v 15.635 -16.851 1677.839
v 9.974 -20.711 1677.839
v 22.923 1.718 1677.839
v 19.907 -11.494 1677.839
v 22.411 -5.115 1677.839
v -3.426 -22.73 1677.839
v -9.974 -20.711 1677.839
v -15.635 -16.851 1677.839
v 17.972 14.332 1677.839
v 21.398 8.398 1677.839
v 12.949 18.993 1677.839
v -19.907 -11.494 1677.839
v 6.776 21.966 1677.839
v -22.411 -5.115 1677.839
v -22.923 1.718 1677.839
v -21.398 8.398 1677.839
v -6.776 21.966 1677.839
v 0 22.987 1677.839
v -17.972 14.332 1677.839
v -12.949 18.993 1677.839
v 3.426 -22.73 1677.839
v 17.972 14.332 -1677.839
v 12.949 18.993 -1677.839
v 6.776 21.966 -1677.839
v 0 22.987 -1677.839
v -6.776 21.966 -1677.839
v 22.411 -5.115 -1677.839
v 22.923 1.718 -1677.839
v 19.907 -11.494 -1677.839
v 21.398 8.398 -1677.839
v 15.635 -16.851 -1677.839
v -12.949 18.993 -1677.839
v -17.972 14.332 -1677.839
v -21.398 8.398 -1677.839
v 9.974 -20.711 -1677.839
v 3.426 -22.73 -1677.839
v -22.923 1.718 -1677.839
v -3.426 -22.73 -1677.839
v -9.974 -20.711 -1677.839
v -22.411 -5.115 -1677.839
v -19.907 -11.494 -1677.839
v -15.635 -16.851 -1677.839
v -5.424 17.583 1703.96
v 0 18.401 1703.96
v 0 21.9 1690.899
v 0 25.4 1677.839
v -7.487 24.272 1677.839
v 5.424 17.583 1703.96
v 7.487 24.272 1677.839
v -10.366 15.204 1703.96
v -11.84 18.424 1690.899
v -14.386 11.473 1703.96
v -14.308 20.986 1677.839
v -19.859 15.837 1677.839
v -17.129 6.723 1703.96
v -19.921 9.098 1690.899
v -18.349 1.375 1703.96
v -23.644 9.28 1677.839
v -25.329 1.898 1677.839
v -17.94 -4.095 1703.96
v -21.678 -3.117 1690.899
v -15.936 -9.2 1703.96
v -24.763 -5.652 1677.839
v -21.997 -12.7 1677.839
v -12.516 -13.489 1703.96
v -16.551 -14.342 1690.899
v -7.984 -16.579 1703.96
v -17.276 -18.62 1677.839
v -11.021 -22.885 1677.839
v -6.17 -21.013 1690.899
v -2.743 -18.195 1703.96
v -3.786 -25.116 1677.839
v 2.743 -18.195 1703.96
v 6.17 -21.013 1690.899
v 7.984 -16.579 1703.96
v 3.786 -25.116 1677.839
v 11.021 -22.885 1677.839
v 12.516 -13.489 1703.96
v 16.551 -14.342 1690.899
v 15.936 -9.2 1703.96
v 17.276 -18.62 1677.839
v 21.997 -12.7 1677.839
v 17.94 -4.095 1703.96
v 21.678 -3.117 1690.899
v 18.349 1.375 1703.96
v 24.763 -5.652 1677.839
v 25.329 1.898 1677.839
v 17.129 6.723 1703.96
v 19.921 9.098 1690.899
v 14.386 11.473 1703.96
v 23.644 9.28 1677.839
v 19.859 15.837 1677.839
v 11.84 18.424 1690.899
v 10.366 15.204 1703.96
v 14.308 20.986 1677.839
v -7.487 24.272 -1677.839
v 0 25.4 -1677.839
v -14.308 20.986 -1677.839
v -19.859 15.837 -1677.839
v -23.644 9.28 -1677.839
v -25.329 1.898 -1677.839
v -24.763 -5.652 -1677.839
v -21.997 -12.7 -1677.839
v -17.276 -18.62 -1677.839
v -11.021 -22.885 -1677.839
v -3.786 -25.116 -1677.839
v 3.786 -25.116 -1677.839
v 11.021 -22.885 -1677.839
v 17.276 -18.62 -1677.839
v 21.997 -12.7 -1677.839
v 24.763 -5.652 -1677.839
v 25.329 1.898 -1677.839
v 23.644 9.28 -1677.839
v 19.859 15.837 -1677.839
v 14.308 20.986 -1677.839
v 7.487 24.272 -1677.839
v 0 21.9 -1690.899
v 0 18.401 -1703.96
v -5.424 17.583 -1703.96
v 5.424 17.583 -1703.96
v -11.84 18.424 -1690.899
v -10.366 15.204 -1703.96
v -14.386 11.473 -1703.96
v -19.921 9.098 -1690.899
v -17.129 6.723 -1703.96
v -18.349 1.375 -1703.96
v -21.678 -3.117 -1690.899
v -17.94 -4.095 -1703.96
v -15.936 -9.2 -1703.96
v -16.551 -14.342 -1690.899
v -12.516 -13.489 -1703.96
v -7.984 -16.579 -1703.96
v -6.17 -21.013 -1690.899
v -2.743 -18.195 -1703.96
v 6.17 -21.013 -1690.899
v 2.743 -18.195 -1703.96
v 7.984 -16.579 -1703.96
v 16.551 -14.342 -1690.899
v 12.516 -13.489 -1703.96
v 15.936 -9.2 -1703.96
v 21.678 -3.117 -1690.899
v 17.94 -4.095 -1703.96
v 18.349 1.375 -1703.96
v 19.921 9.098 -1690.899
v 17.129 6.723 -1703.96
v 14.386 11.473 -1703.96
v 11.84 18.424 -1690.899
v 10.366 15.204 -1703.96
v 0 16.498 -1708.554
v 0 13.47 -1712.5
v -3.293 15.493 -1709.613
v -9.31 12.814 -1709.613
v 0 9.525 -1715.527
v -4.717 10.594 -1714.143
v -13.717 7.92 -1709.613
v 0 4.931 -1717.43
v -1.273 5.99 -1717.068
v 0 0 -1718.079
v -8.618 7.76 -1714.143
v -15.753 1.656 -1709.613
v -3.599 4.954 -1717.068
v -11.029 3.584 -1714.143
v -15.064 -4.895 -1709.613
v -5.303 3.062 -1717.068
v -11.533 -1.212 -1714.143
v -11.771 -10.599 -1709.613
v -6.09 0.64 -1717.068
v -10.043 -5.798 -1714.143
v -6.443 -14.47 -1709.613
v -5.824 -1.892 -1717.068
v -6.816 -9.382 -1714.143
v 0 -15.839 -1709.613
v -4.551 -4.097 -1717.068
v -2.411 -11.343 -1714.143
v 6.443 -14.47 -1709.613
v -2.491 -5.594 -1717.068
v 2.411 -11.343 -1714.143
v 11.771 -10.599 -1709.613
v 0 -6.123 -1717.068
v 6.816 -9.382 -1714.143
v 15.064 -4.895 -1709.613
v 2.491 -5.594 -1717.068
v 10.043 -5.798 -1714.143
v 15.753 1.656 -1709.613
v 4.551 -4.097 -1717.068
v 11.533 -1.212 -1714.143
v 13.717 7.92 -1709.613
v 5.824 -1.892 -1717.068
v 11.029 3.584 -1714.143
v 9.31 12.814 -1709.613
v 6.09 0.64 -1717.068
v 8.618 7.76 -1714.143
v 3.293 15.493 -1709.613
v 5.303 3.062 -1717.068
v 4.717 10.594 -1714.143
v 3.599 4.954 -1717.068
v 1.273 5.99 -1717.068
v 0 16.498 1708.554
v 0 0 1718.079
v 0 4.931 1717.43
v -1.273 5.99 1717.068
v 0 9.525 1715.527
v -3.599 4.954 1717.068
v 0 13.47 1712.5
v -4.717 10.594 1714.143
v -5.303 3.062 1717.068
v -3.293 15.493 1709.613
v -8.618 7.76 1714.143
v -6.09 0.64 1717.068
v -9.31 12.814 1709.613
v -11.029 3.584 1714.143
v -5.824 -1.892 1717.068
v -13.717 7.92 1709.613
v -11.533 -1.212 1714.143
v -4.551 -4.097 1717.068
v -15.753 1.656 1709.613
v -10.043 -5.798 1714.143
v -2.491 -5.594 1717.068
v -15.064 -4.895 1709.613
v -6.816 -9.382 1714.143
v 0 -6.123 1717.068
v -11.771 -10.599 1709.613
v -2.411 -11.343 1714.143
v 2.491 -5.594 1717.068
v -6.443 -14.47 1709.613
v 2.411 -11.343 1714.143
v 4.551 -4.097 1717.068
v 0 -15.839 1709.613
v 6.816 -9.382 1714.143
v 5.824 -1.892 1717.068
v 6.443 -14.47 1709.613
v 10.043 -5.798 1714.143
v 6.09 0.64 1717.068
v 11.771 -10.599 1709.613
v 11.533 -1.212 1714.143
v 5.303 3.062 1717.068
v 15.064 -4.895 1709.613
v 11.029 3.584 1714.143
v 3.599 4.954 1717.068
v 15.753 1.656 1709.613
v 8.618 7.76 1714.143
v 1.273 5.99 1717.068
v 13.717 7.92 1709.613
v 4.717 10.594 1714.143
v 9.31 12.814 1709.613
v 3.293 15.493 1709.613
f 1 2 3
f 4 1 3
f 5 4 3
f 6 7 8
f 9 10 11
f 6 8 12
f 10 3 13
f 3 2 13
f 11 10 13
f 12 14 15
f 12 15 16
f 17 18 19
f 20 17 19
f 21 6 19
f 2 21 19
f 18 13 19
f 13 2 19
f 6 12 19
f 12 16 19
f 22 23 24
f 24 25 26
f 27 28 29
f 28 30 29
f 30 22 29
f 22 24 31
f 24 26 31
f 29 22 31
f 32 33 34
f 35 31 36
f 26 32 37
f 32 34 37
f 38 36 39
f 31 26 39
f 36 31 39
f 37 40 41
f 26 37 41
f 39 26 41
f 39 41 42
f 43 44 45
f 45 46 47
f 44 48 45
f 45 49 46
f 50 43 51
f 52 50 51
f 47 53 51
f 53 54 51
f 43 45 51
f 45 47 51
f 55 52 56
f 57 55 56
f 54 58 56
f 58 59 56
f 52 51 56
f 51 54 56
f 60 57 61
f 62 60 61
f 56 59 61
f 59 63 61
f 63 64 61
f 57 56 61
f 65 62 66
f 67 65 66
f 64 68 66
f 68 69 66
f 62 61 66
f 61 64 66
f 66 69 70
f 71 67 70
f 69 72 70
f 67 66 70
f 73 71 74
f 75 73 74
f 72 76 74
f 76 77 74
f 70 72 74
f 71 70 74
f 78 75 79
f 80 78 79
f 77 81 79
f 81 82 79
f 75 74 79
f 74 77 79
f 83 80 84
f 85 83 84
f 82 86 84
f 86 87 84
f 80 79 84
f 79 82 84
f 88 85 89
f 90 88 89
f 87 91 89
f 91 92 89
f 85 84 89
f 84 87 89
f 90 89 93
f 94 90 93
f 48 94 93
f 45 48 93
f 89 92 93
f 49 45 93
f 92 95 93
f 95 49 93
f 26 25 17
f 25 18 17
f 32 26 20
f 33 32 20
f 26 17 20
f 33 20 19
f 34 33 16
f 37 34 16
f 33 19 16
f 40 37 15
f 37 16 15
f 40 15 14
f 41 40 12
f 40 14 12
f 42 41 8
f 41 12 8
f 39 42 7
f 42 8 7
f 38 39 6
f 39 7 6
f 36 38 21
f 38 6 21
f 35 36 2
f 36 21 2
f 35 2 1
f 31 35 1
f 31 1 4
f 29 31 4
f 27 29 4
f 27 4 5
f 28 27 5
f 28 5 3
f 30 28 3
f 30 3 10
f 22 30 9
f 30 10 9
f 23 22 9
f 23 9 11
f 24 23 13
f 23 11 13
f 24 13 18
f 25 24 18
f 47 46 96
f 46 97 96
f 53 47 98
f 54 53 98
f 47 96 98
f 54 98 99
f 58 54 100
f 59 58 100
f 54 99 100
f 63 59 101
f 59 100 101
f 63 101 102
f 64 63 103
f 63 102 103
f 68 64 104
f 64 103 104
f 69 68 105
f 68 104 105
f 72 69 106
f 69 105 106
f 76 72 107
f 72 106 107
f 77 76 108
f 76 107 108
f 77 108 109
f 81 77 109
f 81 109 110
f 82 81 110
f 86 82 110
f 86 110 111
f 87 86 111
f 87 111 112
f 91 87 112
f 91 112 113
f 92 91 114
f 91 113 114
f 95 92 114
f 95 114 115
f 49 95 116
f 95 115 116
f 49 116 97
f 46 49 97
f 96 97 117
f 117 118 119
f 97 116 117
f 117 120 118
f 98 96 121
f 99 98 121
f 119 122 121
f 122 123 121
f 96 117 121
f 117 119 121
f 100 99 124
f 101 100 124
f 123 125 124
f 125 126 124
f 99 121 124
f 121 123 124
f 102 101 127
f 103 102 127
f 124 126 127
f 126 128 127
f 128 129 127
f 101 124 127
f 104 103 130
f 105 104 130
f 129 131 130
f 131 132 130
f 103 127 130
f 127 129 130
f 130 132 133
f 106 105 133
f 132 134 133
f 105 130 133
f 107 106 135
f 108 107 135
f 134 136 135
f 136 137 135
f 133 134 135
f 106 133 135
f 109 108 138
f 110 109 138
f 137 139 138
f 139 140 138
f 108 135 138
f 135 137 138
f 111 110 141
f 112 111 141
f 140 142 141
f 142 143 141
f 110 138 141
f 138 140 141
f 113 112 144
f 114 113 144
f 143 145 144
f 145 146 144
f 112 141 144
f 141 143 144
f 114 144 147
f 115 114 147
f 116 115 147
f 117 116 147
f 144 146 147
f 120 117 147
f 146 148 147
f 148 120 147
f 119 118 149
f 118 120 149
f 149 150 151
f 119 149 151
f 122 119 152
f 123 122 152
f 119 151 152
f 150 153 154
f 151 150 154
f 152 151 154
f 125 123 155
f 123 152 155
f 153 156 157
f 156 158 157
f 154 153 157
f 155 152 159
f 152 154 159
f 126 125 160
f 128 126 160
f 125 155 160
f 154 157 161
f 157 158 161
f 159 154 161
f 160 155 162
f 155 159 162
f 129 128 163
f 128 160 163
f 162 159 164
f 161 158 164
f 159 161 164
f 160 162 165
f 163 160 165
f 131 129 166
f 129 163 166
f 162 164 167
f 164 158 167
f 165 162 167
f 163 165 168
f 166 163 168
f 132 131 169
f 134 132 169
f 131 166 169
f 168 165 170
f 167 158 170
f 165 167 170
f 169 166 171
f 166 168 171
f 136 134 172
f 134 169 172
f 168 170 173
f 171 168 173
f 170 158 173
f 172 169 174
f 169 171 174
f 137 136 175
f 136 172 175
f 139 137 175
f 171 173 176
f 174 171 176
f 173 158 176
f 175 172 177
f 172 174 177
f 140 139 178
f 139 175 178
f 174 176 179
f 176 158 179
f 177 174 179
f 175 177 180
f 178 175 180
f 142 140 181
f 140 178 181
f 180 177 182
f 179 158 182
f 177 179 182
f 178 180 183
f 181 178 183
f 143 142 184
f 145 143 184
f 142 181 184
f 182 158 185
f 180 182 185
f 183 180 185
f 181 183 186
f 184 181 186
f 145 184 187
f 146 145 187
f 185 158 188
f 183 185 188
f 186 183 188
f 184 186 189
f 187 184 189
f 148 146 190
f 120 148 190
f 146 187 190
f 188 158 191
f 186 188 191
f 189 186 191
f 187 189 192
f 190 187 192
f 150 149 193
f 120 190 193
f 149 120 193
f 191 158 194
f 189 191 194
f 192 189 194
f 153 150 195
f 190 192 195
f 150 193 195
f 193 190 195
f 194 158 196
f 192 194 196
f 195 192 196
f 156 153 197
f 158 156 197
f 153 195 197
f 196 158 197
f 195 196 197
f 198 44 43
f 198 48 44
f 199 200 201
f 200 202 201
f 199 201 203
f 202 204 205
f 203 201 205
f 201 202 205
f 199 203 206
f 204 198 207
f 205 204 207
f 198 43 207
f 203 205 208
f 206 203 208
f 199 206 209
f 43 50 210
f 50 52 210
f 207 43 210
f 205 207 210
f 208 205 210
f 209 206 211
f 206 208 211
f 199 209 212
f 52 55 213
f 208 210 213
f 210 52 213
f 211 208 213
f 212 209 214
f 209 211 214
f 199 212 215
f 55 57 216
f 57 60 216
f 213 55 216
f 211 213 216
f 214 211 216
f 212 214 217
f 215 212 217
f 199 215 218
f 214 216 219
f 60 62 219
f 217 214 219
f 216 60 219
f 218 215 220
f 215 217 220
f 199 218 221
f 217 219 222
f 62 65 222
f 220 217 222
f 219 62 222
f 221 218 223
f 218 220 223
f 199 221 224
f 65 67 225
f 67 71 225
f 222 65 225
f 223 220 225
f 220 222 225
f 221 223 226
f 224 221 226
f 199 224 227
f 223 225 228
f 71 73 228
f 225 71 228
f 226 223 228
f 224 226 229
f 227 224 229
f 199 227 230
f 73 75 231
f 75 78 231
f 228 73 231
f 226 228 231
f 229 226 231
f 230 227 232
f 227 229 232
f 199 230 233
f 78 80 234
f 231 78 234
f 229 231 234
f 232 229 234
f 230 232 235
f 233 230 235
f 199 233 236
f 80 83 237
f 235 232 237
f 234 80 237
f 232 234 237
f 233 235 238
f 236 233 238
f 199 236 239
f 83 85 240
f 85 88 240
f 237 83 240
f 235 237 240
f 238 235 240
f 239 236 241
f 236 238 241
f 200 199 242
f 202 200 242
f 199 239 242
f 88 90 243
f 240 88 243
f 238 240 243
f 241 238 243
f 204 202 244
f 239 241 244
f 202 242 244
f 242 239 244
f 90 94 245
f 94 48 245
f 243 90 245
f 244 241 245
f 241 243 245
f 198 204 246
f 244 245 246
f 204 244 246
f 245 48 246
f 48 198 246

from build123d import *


with BuildPart() as part:
    # Sketch2 → Revolve1 (revolve)
    with BuildSketch(Plane(origin=(0, 0, 0), x_dir=(0, 0, -1), z_dir=(1, 0, 0))):
        with BuildLine():
            Line((1677.838872597, 25.4), (1703.959917956, 18.400886991))
            ThreePointArc((1703.959917956, 18.400886991), (1714.142796279, 11.596905223), (1718.079415146, 0))
            Line((1718.079415146, 0), (1677.838872597, 0))
            Line((1677.838872597, 0), (1677.838872597, 22.987))
            Line((1677.838872597, 22.987), (0, 22.987))
            Line((0, 22.987), (-1677.838872597, 22.987))
            Line((-1677.838872597, 22.987), (-1677.838872597, 0))
            Line((-1677.838872597, 0), (-1718.079415146, 0))
            ThreePointArc((-1718.079415146, 0), (-1714.142796279, 11.596905223), (-1703.959917956, 18.400886991))
            Line((-1703.959917956, 18.400886991), (-1677.838872597, 25.4))
            Line((-1677.838872597, 25.4), (1677.838872597, 25.4))
        make_face()
    revolve(axis=Axis((0, 0, -1718.079415146), (0, 0, 1)))


solid = part.part
